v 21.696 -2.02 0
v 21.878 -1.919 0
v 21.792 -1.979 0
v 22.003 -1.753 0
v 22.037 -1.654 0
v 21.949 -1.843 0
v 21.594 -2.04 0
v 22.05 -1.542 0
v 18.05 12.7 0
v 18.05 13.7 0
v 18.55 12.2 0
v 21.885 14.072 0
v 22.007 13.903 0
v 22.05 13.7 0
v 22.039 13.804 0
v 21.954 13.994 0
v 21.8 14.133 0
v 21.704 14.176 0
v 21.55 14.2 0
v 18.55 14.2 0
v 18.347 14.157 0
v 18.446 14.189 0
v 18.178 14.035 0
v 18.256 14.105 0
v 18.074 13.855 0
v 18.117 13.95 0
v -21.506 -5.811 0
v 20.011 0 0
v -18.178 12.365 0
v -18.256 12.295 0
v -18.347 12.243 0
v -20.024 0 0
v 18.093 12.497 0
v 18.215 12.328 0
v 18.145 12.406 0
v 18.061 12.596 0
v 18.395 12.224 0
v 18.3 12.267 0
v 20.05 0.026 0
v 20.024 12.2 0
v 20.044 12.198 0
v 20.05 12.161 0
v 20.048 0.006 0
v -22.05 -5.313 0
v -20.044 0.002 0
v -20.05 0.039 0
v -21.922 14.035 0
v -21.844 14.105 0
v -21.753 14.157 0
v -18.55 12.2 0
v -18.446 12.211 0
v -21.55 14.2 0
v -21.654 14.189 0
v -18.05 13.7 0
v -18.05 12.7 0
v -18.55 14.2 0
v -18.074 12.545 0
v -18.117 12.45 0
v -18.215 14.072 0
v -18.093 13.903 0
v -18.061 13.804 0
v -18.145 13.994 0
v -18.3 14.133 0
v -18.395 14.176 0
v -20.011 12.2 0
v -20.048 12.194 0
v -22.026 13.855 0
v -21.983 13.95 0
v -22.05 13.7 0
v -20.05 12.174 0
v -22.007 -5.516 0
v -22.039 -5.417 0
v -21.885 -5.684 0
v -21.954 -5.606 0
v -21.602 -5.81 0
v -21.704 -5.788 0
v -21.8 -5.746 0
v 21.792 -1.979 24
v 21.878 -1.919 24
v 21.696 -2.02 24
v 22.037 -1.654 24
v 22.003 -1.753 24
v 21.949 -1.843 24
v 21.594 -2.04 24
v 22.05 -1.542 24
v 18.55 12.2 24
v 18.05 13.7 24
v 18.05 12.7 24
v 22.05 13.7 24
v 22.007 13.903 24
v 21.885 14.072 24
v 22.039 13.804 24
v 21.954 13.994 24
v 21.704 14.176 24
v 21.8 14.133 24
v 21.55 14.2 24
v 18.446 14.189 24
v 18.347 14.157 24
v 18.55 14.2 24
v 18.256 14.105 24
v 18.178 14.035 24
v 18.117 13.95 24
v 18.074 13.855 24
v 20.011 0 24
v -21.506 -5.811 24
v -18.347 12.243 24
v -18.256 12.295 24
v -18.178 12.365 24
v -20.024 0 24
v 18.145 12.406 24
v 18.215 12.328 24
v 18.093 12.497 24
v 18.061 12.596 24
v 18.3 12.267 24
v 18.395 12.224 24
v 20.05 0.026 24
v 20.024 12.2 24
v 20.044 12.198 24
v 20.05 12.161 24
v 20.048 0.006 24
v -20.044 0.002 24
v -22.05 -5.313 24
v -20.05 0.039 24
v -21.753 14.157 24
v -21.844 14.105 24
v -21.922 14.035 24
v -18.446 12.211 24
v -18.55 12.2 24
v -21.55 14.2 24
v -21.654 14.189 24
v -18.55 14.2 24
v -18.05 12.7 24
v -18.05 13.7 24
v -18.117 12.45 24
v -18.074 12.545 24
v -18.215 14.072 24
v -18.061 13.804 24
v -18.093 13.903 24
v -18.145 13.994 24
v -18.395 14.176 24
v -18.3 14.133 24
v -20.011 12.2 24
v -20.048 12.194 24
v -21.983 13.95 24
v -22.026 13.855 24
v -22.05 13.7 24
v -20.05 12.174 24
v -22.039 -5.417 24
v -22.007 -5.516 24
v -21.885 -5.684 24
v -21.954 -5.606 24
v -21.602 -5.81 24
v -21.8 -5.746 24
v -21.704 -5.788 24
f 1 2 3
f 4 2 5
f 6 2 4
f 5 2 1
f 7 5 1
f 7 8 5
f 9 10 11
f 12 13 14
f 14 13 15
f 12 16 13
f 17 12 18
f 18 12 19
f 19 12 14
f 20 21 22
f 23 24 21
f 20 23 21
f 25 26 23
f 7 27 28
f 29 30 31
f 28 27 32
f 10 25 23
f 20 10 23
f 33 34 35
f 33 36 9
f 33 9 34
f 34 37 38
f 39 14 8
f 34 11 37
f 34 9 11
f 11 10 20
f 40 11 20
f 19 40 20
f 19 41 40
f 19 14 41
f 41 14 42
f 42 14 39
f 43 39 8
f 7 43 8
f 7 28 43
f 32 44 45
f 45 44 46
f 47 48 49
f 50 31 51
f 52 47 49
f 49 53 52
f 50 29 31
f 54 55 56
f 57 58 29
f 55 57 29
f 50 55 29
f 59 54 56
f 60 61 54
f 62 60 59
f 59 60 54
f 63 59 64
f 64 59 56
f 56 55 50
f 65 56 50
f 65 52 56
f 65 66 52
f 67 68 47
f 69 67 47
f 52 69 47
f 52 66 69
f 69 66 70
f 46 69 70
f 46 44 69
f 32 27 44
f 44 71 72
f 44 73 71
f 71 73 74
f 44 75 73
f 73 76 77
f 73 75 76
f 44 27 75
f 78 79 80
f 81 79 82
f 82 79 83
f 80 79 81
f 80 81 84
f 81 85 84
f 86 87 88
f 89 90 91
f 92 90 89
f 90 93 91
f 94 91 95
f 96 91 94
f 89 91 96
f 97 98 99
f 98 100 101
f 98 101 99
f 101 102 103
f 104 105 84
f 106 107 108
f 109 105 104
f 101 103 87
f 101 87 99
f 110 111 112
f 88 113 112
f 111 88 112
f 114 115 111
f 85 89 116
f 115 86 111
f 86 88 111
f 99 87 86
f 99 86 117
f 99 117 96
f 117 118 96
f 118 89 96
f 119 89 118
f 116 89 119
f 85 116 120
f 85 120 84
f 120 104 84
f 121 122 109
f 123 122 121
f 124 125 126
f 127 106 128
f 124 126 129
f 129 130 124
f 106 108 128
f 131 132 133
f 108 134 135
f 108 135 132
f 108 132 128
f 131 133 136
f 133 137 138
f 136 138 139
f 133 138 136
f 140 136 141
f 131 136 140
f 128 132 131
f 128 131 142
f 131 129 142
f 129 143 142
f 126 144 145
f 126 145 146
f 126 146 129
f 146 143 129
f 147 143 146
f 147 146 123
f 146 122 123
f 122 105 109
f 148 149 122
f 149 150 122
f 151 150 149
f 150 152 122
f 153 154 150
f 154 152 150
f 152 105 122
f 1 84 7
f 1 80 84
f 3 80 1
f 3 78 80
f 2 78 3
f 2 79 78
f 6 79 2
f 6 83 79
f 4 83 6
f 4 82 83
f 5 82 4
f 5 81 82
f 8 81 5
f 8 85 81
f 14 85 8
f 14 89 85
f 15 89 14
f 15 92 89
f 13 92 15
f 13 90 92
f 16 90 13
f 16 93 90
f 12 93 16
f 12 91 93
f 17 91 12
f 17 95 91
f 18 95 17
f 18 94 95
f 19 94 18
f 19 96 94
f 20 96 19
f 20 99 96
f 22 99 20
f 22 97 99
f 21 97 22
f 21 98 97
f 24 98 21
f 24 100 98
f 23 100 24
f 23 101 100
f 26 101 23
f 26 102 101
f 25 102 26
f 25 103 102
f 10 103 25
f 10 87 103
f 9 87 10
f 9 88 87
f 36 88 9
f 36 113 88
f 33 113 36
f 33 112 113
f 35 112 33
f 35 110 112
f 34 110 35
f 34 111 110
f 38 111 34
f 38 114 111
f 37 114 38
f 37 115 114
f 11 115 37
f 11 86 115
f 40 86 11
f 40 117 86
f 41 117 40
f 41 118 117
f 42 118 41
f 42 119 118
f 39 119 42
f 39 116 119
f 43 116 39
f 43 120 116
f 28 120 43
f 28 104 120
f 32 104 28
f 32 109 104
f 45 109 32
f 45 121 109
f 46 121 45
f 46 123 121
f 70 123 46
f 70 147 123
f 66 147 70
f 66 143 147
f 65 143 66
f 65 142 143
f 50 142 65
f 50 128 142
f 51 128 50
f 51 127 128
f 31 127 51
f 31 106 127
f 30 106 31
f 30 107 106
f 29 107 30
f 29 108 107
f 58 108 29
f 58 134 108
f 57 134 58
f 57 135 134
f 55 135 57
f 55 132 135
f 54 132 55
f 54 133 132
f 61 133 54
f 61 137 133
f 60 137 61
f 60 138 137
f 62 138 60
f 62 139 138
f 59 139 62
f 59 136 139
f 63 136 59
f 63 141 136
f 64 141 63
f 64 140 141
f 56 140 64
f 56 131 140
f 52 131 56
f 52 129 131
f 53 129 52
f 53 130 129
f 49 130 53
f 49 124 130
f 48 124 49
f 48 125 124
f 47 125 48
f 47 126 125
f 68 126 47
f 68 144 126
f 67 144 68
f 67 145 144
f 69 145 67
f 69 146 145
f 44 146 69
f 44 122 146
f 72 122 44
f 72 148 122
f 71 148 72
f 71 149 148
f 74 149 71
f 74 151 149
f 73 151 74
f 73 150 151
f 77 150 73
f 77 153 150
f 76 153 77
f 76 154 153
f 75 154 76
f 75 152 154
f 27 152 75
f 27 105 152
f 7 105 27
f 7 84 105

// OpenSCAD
$fn = 30;
// track width, +0.1 for inner wall
W = 40.0 + 0.1;
// track height, +0.1 for inner wall
H = 12.1 + 0.1;
// length of holder
L = 24.0;
// depth for holder to go inside
D = 2.0;
// thickness of each wall
T = 2;
// angle
A = 5;
// offset
OFS = 0.5;

linear_extrude(height=L)
	offset(OFS) offset(-OFS)
		polygon(points = [
					[-W/2, 0], [-W/2, H],
					[-W/2+D, H], [-W/2+D, H+T],
					[-W/2-T, H+T], [-W/2-T, -T-(W+2*T)*tan(A)],
					[W/2+T, -T], [W/2+T, H+T],
					[W/2-D, H+T], [W/2-D, H],
					[W/2, H], [W/2, 0]
					]);
